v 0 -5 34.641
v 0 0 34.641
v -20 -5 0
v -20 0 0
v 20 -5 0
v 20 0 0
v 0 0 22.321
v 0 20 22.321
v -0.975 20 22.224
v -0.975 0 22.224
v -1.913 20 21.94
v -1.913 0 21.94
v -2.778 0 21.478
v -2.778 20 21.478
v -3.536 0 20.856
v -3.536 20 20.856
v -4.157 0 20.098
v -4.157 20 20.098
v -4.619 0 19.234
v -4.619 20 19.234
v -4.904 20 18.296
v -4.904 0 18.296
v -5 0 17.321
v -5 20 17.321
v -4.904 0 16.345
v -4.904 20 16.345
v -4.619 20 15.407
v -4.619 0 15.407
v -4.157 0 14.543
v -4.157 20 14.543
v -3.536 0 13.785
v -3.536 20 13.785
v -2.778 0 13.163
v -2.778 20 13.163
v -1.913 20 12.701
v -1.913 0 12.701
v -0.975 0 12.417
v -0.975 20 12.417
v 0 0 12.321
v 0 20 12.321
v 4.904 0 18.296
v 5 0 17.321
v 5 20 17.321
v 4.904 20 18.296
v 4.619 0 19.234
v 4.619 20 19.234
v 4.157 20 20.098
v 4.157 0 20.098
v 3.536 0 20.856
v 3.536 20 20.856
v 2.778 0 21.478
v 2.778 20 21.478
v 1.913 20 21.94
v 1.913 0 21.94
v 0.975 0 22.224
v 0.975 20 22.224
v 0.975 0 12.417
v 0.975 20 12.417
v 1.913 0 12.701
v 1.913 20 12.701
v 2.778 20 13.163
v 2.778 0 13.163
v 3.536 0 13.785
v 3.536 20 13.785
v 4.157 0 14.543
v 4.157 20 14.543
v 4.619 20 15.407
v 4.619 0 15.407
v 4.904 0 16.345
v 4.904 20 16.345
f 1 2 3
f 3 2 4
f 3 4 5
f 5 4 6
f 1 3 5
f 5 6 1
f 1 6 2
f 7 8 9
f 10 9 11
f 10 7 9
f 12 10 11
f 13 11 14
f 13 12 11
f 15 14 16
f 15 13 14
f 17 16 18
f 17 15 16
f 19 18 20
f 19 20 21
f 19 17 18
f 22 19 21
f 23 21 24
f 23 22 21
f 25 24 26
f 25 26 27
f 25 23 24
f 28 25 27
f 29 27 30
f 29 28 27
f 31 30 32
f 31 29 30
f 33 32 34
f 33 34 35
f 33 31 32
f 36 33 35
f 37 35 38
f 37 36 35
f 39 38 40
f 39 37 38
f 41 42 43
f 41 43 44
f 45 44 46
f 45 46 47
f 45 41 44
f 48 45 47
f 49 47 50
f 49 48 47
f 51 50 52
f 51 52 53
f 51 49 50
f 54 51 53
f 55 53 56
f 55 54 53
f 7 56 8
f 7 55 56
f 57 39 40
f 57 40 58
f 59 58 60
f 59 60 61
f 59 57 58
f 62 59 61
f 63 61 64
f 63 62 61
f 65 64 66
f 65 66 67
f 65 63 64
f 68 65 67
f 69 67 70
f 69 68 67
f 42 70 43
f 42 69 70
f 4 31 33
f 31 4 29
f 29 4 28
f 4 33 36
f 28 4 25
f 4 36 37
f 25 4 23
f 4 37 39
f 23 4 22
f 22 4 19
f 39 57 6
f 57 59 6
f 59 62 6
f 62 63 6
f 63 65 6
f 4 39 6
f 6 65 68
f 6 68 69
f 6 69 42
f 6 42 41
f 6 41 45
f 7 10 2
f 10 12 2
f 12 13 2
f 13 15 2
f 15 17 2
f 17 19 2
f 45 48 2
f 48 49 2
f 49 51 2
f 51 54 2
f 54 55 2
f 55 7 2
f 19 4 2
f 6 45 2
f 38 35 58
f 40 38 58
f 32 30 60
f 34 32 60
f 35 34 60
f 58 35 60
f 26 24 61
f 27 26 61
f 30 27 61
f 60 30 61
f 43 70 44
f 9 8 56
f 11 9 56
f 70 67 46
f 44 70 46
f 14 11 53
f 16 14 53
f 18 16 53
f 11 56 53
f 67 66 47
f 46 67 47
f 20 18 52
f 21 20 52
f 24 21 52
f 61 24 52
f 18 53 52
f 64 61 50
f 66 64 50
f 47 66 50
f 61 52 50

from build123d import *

# Parameters (mm, degrees)
F1_DEPTH = 5
F3_DEPTH = 25


with BuildPart() as f1:
    # F0 (on Front) → F1 (new body)
    with BuildSketch(Plane.XZ):
        Polygon((-20, 0), (0, 0), (20, 0), (0, 34.6410161514), align=None)
    extrude(amount=F1_DEPTH)

    # F2 (on face) → F3 (join)
    with BuildSketch(Plane.XZ.offset(5)):
        with BuildLine():
            Line((0, 22.3205080757), (0, 12.3205080757))
            ThreePointArc((0, 12.3205080757), (3.5355339059, 13.7849741698), (5, 17.3205080757))
            ThreePointArc((5, 17.3205080757), (3.5355339059, 20.8560419816), (0, 22.3205080757))
        make_face()
        with BuildLine():
            ThreePointArc((0, 22.3205080757), (-5, 17.3205080757), (0, 12.3205080757))
            Line((0, 12.3205080757), (0, 22.3205080757))
        make_face()
    extrude(amount=-F3_DEPTH)


solid = f1.part
